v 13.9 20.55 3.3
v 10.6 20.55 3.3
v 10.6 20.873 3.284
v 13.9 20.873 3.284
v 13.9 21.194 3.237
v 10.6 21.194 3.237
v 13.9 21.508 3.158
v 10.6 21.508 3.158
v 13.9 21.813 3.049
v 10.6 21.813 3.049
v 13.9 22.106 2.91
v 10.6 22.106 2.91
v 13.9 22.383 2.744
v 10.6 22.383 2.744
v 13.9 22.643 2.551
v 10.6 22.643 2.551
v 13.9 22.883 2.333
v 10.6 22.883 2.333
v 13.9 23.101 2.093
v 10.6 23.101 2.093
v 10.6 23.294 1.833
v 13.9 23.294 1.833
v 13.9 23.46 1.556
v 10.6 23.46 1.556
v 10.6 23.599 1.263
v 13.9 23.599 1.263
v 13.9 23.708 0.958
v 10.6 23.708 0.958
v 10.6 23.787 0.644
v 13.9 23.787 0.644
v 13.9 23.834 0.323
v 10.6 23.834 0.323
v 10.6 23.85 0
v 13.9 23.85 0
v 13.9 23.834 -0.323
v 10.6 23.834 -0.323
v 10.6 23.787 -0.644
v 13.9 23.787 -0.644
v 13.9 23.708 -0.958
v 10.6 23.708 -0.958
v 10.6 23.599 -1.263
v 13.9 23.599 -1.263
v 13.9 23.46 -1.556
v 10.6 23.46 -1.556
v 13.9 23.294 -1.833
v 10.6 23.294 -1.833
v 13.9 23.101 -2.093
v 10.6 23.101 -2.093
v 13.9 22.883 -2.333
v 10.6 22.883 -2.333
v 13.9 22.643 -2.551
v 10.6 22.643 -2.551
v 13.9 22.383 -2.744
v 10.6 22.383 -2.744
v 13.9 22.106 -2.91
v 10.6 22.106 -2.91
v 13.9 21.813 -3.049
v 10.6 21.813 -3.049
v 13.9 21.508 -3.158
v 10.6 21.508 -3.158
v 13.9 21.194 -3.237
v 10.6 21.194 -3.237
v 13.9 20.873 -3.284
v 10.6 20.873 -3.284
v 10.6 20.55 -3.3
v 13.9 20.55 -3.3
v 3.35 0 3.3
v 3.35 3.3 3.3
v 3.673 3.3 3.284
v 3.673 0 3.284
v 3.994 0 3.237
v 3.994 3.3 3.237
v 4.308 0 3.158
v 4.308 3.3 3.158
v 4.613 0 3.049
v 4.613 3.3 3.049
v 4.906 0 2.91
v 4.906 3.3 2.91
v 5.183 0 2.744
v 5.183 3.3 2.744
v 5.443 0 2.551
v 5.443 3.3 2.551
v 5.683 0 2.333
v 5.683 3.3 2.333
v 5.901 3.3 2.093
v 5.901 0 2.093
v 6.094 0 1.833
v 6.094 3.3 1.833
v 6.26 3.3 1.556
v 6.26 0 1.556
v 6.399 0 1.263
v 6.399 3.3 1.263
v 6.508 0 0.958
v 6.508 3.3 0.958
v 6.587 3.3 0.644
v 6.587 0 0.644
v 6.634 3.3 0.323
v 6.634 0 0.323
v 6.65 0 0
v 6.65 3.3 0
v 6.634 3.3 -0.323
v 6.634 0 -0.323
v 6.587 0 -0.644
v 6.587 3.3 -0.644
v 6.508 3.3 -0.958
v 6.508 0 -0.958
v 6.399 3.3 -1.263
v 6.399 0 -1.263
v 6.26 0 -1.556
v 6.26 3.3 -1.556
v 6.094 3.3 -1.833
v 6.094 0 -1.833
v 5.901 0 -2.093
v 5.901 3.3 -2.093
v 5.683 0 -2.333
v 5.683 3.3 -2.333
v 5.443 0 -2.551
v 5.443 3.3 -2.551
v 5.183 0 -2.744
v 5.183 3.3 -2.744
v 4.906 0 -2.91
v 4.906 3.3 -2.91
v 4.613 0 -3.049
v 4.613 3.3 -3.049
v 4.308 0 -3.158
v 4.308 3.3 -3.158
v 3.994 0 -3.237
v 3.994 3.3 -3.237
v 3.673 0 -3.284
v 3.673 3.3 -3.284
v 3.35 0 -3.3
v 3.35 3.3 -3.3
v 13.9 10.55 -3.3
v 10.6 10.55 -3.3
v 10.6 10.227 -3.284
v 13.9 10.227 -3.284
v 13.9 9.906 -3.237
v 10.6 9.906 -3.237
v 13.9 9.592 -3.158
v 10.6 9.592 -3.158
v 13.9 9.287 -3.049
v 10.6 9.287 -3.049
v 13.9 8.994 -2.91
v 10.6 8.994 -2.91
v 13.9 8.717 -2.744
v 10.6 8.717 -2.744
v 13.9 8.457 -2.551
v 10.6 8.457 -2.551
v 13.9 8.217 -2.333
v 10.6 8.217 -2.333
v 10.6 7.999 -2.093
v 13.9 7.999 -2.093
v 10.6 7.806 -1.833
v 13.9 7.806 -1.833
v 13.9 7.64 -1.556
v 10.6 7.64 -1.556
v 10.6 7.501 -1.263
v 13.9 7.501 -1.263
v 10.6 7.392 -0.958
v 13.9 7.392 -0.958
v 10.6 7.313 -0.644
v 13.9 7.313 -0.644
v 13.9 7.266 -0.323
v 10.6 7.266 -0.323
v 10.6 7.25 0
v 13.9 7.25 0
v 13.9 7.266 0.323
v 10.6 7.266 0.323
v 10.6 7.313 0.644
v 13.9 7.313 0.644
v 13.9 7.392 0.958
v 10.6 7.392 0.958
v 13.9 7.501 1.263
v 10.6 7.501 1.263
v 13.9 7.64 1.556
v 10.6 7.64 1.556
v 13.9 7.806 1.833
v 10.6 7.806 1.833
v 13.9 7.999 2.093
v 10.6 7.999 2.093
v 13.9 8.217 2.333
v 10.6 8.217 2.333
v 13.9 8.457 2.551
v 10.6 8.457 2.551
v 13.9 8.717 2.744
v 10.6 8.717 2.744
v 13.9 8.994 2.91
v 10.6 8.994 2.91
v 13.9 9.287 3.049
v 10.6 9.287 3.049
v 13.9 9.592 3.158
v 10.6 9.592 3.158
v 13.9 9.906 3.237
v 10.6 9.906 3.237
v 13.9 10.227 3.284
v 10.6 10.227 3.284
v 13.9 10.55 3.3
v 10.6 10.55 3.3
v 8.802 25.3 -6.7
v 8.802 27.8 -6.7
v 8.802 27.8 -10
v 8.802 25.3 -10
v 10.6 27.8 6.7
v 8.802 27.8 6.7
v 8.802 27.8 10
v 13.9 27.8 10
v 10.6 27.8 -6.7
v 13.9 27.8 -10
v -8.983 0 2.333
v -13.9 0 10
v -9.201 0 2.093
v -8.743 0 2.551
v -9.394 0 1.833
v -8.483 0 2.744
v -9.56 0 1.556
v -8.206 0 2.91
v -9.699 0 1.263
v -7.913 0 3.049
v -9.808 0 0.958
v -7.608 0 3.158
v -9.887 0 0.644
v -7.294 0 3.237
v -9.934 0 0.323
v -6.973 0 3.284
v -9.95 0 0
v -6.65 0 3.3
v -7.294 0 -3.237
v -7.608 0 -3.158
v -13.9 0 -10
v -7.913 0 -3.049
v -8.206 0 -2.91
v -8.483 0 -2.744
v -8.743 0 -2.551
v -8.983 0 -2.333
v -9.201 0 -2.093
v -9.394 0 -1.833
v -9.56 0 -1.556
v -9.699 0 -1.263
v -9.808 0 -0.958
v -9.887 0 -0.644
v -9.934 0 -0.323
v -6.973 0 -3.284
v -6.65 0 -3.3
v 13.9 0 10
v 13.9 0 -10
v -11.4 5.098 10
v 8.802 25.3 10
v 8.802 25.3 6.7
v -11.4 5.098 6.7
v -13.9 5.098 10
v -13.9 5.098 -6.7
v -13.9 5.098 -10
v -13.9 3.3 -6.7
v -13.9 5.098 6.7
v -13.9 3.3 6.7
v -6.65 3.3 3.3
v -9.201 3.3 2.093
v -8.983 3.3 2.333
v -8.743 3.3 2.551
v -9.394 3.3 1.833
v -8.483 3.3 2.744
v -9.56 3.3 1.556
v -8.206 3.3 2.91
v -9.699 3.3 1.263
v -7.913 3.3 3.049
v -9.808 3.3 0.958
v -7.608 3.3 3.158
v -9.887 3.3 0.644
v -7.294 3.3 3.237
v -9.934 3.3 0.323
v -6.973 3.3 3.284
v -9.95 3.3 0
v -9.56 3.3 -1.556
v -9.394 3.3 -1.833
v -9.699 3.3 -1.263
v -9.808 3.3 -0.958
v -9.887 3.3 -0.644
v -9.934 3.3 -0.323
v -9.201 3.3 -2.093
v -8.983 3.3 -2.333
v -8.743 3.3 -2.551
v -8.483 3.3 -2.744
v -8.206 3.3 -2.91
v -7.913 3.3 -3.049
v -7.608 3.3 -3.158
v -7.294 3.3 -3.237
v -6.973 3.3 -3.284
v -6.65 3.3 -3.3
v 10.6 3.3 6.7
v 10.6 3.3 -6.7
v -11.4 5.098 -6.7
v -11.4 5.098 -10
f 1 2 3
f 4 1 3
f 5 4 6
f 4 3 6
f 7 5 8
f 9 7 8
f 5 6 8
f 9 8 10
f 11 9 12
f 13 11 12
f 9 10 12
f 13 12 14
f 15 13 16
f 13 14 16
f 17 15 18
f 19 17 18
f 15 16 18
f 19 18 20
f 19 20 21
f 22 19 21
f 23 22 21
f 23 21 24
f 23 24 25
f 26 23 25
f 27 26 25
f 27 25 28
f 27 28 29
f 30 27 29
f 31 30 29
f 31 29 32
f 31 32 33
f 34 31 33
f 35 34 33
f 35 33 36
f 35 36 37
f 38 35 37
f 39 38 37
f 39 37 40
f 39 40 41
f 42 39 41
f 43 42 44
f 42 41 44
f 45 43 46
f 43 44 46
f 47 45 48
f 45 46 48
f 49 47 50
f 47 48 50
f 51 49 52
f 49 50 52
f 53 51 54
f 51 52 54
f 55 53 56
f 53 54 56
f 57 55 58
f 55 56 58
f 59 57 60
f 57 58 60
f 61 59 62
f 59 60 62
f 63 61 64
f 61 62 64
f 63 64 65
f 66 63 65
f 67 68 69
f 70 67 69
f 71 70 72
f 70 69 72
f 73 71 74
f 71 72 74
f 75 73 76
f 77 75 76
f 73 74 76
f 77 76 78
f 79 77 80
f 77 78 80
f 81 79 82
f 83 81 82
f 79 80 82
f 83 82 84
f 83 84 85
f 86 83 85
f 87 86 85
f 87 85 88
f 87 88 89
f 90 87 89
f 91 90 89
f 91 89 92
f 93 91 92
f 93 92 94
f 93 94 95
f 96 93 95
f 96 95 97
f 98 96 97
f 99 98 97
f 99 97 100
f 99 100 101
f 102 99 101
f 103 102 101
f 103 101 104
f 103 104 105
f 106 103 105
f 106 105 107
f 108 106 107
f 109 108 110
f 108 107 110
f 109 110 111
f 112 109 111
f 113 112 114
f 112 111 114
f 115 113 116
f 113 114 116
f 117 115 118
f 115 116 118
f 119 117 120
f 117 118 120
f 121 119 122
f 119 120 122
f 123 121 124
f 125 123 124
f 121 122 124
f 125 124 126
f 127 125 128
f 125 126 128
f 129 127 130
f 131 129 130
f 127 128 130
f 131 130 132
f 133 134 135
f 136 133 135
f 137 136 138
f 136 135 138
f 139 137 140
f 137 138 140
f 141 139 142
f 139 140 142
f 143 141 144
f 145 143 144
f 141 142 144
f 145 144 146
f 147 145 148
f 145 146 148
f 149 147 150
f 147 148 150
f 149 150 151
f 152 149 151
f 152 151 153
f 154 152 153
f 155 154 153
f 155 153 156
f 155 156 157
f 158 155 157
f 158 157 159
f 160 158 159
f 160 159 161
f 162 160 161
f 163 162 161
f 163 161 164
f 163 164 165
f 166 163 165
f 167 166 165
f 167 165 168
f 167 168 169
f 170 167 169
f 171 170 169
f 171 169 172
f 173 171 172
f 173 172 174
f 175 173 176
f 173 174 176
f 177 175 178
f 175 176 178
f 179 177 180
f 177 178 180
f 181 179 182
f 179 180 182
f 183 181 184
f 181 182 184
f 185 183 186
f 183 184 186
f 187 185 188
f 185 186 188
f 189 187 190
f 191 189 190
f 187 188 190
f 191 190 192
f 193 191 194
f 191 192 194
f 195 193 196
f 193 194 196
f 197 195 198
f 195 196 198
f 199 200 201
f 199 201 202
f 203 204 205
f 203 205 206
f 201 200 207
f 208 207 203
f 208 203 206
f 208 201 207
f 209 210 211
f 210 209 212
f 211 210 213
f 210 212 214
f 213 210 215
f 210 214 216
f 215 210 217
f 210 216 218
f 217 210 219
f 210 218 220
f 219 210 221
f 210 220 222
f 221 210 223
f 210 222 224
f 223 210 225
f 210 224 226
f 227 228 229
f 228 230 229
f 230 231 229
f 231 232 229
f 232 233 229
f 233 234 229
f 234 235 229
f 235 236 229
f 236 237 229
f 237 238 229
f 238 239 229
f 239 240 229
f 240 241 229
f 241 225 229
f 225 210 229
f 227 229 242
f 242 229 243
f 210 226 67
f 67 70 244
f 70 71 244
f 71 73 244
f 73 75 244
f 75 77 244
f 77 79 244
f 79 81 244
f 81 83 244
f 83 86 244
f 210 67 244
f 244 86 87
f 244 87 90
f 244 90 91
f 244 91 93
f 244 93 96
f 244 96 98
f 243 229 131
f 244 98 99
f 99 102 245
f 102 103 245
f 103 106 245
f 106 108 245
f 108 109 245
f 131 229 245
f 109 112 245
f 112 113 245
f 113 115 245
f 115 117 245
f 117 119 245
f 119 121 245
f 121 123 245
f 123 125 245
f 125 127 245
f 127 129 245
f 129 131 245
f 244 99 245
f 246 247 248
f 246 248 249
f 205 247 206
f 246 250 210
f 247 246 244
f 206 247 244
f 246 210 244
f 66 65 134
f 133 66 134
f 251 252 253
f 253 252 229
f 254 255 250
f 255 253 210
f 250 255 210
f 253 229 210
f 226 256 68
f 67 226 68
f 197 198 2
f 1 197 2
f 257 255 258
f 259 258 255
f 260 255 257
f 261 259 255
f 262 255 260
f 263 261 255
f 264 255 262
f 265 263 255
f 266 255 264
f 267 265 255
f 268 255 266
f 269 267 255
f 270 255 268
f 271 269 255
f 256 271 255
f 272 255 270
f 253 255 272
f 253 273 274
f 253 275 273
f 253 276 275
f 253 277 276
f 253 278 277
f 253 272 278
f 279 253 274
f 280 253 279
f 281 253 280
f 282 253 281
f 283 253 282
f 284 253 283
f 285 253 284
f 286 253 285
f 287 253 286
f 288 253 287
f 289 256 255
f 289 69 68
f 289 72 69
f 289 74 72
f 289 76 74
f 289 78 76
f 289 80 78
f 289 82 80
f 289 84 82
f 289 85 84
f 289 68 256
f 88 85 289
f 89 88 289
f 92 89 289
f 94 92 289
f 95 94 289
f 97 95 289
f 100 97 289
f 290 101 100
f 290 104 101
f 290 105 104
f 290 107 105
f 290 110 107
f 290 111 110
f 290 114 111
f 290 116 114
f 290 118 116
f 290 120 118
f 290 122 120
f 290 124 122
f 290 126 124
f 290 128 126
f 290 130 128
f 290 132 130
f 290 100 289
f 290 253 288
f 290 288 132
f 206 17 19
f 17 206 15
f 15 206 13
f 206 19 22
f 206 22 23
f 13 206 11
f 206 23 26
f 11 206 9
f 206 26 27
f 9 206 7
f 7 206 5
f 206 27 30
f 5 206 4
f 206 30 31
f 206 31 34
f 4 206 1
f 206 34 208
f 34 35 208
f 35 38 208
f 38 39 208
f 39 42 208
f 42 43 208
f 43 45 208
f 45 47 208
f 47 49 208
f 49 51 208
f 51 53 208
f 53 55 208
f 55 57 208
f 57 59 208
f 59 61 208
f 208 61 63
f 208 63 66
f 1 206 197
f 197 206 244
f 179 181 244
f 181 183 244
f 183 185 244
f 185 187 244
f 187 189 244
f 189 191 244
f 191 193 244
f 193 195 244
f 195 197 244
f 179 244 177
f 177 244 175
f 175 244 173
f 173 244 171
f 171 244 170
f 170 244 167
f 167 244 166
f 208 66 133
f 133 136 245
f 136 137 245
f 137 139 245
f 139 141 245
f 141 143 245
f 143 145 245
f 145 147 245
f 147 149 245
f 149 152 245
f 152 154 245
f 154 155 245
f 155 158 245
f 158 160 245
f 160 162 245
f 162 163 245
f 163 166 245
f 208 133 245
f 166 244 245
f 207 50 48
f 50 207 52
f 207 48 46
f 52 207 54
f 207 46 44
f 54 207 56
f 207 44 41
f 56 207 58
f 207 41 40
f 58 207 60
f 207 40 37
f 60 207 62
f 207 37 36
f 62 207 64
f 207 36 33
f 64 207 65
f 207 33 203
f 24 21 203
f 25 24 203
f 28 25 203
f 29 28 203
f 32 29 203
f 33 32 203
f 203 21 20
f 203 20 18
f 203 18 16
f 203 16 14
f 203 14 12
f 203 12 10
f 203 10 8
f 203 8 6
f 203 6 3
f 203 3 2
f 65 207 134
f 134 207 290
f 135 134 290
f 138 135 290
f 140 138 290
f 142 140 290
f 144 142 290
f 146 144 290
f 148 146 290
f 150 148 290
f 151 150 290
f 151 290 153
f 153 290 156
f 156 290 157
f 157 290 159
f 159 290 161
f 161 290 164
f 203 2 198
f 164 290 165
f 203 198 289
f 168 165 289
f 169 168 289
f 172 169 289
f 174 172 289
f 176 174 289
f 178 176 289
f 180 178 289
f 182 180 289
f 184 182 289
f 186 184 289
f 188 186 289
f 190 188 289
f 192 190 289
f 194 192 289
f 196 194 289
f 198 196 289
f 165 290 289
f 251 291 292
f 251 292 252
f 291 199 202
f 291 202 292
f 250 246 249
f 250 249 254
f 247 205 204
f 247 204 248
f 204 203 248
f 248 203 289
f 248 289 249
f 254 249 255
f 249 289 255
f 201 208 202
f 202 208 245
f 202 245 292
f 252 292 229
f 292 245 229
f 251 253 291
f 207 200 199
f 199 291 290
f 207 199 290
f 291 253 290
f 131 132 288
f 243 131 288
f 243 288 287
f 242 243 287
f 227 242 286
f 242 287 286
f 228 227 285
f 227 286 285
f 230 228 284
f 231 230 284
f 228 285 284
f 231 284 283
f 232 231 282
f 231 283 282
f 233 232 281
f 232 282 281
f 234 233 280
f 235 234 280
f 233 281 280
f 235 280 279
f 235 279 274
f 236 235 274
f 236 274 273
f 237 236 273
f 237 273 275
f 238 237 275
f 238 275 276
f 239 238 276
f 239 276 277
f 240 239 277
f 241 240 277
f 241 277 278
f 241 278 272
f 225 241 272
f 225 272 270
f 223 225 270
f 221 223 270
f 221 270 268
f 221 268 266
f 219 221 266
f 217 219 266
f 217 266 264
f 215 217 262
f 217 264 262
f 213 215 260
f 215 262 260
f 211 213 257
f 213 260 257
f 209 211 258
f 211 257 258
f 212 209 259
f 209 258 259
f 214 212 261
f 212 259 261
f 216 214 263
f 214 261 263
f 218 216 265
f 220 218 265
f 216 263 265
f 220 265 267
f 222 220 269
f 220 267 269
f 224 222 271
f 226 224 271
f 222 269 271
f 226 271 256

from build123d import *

# Parameters (mm, degrees)
SKETCH_2_W          = 27.8
SKETCH_2_H          = 20
EXTRUDE_1_DEPTH     = 3.3
EXTRUDE_2_DEPTH     = 24.5
CUT_EXTRUDE_1_DEPTH = 24.8
CUT_EXTRUDE_2_DEPTH = 24.8
CUT_EXTRUDE_3_DEPTH = 24.8


with BuildPart() as part:
    # 草图2 → 凸台-拉伸1 (new body)
    with BuildSketch(Plane(origin=(0, 0, 0), x_dir=(1, 0, 0), z_dir=(0, 1, 0))):
        Rectangle(SKETCH_2_W, SKETCH_2_H)
    extrude(amount=EXTRUDE_1_DEPTH)

    # 草图4 → 凸台-拉伸2 (add)
    with BuildSketch(Plane(origin=(0, 3.3, 0), x_dir=(1, 0, 0), z_dir=(0, 1, 0))):
        Polygon((-13.9, 10), (-13.9, 6.7), (10.6, 6.7), (10.6, -6.7), (-13.9, -6.7), (-13.9, -10), (13.9, -10), (13.9, 10), align=None)
    extrude(amount=EXTRUDE_2_DEPTH)

    # 草图5 → 切除-拉伸1 (cut)
    with BuildSketch(Plane.XY.offset(10)):
        Polygon((8.801548781, 27.8), (8.801548781, 25.3), (-11.4, 5.098451219), (-13.9, 5.098451219), (-13.9, 27.8), align=None)
    extrude(amount=-CUT_EXTRUDE_1_DEPTH, mode=Mode.SUBTRACT)

    # 草图6 → 切除-拉伸2 (cut)
    with BuildSketch(Plane.ZY.offset(-10.6)):
        with BuildLine():
            Line((-3.3, 20.55), (-3.3, 10.55))
            ThreePointArc((-3.3, 10.55), (0, 7.25), (3.3, 10.55))
            Line((3.3, 10.55), (3.3, 20.55))
            ThreePointArc((3.3, 20.55), (0, 23.85), (-3.3, 20.55))
        make_face()
    extrude(amount=-CUT_EXTRUDE_2_DEPTH, mode=Mode.SUBTRACT)

    # 草图7 → 切除-拉伸3 (cut)
    with BuildSketch(Plane(origin=(0, 3.3, 0), x_dir=(1, 0, 0), z_dir=(0, 1, 0))):
        with BuildLine():
            Line((3.35, 3.3), (-6.65, 3.3))
            ThreePointArc((-6.65, 3.3), (-9.95, 0), (-6.65, -3.3))
            Line((-6.65, -3.3), (3.35, -3.3))
            ThreePointArc((3.35, -3.3), (6.65, 0), (3.35, 3.3))
        make_face()
    extrude(amount=-CUT_EXTRUDE_3_DEPTH, mode=Mode.SUBTRACT)


solid = part.part
